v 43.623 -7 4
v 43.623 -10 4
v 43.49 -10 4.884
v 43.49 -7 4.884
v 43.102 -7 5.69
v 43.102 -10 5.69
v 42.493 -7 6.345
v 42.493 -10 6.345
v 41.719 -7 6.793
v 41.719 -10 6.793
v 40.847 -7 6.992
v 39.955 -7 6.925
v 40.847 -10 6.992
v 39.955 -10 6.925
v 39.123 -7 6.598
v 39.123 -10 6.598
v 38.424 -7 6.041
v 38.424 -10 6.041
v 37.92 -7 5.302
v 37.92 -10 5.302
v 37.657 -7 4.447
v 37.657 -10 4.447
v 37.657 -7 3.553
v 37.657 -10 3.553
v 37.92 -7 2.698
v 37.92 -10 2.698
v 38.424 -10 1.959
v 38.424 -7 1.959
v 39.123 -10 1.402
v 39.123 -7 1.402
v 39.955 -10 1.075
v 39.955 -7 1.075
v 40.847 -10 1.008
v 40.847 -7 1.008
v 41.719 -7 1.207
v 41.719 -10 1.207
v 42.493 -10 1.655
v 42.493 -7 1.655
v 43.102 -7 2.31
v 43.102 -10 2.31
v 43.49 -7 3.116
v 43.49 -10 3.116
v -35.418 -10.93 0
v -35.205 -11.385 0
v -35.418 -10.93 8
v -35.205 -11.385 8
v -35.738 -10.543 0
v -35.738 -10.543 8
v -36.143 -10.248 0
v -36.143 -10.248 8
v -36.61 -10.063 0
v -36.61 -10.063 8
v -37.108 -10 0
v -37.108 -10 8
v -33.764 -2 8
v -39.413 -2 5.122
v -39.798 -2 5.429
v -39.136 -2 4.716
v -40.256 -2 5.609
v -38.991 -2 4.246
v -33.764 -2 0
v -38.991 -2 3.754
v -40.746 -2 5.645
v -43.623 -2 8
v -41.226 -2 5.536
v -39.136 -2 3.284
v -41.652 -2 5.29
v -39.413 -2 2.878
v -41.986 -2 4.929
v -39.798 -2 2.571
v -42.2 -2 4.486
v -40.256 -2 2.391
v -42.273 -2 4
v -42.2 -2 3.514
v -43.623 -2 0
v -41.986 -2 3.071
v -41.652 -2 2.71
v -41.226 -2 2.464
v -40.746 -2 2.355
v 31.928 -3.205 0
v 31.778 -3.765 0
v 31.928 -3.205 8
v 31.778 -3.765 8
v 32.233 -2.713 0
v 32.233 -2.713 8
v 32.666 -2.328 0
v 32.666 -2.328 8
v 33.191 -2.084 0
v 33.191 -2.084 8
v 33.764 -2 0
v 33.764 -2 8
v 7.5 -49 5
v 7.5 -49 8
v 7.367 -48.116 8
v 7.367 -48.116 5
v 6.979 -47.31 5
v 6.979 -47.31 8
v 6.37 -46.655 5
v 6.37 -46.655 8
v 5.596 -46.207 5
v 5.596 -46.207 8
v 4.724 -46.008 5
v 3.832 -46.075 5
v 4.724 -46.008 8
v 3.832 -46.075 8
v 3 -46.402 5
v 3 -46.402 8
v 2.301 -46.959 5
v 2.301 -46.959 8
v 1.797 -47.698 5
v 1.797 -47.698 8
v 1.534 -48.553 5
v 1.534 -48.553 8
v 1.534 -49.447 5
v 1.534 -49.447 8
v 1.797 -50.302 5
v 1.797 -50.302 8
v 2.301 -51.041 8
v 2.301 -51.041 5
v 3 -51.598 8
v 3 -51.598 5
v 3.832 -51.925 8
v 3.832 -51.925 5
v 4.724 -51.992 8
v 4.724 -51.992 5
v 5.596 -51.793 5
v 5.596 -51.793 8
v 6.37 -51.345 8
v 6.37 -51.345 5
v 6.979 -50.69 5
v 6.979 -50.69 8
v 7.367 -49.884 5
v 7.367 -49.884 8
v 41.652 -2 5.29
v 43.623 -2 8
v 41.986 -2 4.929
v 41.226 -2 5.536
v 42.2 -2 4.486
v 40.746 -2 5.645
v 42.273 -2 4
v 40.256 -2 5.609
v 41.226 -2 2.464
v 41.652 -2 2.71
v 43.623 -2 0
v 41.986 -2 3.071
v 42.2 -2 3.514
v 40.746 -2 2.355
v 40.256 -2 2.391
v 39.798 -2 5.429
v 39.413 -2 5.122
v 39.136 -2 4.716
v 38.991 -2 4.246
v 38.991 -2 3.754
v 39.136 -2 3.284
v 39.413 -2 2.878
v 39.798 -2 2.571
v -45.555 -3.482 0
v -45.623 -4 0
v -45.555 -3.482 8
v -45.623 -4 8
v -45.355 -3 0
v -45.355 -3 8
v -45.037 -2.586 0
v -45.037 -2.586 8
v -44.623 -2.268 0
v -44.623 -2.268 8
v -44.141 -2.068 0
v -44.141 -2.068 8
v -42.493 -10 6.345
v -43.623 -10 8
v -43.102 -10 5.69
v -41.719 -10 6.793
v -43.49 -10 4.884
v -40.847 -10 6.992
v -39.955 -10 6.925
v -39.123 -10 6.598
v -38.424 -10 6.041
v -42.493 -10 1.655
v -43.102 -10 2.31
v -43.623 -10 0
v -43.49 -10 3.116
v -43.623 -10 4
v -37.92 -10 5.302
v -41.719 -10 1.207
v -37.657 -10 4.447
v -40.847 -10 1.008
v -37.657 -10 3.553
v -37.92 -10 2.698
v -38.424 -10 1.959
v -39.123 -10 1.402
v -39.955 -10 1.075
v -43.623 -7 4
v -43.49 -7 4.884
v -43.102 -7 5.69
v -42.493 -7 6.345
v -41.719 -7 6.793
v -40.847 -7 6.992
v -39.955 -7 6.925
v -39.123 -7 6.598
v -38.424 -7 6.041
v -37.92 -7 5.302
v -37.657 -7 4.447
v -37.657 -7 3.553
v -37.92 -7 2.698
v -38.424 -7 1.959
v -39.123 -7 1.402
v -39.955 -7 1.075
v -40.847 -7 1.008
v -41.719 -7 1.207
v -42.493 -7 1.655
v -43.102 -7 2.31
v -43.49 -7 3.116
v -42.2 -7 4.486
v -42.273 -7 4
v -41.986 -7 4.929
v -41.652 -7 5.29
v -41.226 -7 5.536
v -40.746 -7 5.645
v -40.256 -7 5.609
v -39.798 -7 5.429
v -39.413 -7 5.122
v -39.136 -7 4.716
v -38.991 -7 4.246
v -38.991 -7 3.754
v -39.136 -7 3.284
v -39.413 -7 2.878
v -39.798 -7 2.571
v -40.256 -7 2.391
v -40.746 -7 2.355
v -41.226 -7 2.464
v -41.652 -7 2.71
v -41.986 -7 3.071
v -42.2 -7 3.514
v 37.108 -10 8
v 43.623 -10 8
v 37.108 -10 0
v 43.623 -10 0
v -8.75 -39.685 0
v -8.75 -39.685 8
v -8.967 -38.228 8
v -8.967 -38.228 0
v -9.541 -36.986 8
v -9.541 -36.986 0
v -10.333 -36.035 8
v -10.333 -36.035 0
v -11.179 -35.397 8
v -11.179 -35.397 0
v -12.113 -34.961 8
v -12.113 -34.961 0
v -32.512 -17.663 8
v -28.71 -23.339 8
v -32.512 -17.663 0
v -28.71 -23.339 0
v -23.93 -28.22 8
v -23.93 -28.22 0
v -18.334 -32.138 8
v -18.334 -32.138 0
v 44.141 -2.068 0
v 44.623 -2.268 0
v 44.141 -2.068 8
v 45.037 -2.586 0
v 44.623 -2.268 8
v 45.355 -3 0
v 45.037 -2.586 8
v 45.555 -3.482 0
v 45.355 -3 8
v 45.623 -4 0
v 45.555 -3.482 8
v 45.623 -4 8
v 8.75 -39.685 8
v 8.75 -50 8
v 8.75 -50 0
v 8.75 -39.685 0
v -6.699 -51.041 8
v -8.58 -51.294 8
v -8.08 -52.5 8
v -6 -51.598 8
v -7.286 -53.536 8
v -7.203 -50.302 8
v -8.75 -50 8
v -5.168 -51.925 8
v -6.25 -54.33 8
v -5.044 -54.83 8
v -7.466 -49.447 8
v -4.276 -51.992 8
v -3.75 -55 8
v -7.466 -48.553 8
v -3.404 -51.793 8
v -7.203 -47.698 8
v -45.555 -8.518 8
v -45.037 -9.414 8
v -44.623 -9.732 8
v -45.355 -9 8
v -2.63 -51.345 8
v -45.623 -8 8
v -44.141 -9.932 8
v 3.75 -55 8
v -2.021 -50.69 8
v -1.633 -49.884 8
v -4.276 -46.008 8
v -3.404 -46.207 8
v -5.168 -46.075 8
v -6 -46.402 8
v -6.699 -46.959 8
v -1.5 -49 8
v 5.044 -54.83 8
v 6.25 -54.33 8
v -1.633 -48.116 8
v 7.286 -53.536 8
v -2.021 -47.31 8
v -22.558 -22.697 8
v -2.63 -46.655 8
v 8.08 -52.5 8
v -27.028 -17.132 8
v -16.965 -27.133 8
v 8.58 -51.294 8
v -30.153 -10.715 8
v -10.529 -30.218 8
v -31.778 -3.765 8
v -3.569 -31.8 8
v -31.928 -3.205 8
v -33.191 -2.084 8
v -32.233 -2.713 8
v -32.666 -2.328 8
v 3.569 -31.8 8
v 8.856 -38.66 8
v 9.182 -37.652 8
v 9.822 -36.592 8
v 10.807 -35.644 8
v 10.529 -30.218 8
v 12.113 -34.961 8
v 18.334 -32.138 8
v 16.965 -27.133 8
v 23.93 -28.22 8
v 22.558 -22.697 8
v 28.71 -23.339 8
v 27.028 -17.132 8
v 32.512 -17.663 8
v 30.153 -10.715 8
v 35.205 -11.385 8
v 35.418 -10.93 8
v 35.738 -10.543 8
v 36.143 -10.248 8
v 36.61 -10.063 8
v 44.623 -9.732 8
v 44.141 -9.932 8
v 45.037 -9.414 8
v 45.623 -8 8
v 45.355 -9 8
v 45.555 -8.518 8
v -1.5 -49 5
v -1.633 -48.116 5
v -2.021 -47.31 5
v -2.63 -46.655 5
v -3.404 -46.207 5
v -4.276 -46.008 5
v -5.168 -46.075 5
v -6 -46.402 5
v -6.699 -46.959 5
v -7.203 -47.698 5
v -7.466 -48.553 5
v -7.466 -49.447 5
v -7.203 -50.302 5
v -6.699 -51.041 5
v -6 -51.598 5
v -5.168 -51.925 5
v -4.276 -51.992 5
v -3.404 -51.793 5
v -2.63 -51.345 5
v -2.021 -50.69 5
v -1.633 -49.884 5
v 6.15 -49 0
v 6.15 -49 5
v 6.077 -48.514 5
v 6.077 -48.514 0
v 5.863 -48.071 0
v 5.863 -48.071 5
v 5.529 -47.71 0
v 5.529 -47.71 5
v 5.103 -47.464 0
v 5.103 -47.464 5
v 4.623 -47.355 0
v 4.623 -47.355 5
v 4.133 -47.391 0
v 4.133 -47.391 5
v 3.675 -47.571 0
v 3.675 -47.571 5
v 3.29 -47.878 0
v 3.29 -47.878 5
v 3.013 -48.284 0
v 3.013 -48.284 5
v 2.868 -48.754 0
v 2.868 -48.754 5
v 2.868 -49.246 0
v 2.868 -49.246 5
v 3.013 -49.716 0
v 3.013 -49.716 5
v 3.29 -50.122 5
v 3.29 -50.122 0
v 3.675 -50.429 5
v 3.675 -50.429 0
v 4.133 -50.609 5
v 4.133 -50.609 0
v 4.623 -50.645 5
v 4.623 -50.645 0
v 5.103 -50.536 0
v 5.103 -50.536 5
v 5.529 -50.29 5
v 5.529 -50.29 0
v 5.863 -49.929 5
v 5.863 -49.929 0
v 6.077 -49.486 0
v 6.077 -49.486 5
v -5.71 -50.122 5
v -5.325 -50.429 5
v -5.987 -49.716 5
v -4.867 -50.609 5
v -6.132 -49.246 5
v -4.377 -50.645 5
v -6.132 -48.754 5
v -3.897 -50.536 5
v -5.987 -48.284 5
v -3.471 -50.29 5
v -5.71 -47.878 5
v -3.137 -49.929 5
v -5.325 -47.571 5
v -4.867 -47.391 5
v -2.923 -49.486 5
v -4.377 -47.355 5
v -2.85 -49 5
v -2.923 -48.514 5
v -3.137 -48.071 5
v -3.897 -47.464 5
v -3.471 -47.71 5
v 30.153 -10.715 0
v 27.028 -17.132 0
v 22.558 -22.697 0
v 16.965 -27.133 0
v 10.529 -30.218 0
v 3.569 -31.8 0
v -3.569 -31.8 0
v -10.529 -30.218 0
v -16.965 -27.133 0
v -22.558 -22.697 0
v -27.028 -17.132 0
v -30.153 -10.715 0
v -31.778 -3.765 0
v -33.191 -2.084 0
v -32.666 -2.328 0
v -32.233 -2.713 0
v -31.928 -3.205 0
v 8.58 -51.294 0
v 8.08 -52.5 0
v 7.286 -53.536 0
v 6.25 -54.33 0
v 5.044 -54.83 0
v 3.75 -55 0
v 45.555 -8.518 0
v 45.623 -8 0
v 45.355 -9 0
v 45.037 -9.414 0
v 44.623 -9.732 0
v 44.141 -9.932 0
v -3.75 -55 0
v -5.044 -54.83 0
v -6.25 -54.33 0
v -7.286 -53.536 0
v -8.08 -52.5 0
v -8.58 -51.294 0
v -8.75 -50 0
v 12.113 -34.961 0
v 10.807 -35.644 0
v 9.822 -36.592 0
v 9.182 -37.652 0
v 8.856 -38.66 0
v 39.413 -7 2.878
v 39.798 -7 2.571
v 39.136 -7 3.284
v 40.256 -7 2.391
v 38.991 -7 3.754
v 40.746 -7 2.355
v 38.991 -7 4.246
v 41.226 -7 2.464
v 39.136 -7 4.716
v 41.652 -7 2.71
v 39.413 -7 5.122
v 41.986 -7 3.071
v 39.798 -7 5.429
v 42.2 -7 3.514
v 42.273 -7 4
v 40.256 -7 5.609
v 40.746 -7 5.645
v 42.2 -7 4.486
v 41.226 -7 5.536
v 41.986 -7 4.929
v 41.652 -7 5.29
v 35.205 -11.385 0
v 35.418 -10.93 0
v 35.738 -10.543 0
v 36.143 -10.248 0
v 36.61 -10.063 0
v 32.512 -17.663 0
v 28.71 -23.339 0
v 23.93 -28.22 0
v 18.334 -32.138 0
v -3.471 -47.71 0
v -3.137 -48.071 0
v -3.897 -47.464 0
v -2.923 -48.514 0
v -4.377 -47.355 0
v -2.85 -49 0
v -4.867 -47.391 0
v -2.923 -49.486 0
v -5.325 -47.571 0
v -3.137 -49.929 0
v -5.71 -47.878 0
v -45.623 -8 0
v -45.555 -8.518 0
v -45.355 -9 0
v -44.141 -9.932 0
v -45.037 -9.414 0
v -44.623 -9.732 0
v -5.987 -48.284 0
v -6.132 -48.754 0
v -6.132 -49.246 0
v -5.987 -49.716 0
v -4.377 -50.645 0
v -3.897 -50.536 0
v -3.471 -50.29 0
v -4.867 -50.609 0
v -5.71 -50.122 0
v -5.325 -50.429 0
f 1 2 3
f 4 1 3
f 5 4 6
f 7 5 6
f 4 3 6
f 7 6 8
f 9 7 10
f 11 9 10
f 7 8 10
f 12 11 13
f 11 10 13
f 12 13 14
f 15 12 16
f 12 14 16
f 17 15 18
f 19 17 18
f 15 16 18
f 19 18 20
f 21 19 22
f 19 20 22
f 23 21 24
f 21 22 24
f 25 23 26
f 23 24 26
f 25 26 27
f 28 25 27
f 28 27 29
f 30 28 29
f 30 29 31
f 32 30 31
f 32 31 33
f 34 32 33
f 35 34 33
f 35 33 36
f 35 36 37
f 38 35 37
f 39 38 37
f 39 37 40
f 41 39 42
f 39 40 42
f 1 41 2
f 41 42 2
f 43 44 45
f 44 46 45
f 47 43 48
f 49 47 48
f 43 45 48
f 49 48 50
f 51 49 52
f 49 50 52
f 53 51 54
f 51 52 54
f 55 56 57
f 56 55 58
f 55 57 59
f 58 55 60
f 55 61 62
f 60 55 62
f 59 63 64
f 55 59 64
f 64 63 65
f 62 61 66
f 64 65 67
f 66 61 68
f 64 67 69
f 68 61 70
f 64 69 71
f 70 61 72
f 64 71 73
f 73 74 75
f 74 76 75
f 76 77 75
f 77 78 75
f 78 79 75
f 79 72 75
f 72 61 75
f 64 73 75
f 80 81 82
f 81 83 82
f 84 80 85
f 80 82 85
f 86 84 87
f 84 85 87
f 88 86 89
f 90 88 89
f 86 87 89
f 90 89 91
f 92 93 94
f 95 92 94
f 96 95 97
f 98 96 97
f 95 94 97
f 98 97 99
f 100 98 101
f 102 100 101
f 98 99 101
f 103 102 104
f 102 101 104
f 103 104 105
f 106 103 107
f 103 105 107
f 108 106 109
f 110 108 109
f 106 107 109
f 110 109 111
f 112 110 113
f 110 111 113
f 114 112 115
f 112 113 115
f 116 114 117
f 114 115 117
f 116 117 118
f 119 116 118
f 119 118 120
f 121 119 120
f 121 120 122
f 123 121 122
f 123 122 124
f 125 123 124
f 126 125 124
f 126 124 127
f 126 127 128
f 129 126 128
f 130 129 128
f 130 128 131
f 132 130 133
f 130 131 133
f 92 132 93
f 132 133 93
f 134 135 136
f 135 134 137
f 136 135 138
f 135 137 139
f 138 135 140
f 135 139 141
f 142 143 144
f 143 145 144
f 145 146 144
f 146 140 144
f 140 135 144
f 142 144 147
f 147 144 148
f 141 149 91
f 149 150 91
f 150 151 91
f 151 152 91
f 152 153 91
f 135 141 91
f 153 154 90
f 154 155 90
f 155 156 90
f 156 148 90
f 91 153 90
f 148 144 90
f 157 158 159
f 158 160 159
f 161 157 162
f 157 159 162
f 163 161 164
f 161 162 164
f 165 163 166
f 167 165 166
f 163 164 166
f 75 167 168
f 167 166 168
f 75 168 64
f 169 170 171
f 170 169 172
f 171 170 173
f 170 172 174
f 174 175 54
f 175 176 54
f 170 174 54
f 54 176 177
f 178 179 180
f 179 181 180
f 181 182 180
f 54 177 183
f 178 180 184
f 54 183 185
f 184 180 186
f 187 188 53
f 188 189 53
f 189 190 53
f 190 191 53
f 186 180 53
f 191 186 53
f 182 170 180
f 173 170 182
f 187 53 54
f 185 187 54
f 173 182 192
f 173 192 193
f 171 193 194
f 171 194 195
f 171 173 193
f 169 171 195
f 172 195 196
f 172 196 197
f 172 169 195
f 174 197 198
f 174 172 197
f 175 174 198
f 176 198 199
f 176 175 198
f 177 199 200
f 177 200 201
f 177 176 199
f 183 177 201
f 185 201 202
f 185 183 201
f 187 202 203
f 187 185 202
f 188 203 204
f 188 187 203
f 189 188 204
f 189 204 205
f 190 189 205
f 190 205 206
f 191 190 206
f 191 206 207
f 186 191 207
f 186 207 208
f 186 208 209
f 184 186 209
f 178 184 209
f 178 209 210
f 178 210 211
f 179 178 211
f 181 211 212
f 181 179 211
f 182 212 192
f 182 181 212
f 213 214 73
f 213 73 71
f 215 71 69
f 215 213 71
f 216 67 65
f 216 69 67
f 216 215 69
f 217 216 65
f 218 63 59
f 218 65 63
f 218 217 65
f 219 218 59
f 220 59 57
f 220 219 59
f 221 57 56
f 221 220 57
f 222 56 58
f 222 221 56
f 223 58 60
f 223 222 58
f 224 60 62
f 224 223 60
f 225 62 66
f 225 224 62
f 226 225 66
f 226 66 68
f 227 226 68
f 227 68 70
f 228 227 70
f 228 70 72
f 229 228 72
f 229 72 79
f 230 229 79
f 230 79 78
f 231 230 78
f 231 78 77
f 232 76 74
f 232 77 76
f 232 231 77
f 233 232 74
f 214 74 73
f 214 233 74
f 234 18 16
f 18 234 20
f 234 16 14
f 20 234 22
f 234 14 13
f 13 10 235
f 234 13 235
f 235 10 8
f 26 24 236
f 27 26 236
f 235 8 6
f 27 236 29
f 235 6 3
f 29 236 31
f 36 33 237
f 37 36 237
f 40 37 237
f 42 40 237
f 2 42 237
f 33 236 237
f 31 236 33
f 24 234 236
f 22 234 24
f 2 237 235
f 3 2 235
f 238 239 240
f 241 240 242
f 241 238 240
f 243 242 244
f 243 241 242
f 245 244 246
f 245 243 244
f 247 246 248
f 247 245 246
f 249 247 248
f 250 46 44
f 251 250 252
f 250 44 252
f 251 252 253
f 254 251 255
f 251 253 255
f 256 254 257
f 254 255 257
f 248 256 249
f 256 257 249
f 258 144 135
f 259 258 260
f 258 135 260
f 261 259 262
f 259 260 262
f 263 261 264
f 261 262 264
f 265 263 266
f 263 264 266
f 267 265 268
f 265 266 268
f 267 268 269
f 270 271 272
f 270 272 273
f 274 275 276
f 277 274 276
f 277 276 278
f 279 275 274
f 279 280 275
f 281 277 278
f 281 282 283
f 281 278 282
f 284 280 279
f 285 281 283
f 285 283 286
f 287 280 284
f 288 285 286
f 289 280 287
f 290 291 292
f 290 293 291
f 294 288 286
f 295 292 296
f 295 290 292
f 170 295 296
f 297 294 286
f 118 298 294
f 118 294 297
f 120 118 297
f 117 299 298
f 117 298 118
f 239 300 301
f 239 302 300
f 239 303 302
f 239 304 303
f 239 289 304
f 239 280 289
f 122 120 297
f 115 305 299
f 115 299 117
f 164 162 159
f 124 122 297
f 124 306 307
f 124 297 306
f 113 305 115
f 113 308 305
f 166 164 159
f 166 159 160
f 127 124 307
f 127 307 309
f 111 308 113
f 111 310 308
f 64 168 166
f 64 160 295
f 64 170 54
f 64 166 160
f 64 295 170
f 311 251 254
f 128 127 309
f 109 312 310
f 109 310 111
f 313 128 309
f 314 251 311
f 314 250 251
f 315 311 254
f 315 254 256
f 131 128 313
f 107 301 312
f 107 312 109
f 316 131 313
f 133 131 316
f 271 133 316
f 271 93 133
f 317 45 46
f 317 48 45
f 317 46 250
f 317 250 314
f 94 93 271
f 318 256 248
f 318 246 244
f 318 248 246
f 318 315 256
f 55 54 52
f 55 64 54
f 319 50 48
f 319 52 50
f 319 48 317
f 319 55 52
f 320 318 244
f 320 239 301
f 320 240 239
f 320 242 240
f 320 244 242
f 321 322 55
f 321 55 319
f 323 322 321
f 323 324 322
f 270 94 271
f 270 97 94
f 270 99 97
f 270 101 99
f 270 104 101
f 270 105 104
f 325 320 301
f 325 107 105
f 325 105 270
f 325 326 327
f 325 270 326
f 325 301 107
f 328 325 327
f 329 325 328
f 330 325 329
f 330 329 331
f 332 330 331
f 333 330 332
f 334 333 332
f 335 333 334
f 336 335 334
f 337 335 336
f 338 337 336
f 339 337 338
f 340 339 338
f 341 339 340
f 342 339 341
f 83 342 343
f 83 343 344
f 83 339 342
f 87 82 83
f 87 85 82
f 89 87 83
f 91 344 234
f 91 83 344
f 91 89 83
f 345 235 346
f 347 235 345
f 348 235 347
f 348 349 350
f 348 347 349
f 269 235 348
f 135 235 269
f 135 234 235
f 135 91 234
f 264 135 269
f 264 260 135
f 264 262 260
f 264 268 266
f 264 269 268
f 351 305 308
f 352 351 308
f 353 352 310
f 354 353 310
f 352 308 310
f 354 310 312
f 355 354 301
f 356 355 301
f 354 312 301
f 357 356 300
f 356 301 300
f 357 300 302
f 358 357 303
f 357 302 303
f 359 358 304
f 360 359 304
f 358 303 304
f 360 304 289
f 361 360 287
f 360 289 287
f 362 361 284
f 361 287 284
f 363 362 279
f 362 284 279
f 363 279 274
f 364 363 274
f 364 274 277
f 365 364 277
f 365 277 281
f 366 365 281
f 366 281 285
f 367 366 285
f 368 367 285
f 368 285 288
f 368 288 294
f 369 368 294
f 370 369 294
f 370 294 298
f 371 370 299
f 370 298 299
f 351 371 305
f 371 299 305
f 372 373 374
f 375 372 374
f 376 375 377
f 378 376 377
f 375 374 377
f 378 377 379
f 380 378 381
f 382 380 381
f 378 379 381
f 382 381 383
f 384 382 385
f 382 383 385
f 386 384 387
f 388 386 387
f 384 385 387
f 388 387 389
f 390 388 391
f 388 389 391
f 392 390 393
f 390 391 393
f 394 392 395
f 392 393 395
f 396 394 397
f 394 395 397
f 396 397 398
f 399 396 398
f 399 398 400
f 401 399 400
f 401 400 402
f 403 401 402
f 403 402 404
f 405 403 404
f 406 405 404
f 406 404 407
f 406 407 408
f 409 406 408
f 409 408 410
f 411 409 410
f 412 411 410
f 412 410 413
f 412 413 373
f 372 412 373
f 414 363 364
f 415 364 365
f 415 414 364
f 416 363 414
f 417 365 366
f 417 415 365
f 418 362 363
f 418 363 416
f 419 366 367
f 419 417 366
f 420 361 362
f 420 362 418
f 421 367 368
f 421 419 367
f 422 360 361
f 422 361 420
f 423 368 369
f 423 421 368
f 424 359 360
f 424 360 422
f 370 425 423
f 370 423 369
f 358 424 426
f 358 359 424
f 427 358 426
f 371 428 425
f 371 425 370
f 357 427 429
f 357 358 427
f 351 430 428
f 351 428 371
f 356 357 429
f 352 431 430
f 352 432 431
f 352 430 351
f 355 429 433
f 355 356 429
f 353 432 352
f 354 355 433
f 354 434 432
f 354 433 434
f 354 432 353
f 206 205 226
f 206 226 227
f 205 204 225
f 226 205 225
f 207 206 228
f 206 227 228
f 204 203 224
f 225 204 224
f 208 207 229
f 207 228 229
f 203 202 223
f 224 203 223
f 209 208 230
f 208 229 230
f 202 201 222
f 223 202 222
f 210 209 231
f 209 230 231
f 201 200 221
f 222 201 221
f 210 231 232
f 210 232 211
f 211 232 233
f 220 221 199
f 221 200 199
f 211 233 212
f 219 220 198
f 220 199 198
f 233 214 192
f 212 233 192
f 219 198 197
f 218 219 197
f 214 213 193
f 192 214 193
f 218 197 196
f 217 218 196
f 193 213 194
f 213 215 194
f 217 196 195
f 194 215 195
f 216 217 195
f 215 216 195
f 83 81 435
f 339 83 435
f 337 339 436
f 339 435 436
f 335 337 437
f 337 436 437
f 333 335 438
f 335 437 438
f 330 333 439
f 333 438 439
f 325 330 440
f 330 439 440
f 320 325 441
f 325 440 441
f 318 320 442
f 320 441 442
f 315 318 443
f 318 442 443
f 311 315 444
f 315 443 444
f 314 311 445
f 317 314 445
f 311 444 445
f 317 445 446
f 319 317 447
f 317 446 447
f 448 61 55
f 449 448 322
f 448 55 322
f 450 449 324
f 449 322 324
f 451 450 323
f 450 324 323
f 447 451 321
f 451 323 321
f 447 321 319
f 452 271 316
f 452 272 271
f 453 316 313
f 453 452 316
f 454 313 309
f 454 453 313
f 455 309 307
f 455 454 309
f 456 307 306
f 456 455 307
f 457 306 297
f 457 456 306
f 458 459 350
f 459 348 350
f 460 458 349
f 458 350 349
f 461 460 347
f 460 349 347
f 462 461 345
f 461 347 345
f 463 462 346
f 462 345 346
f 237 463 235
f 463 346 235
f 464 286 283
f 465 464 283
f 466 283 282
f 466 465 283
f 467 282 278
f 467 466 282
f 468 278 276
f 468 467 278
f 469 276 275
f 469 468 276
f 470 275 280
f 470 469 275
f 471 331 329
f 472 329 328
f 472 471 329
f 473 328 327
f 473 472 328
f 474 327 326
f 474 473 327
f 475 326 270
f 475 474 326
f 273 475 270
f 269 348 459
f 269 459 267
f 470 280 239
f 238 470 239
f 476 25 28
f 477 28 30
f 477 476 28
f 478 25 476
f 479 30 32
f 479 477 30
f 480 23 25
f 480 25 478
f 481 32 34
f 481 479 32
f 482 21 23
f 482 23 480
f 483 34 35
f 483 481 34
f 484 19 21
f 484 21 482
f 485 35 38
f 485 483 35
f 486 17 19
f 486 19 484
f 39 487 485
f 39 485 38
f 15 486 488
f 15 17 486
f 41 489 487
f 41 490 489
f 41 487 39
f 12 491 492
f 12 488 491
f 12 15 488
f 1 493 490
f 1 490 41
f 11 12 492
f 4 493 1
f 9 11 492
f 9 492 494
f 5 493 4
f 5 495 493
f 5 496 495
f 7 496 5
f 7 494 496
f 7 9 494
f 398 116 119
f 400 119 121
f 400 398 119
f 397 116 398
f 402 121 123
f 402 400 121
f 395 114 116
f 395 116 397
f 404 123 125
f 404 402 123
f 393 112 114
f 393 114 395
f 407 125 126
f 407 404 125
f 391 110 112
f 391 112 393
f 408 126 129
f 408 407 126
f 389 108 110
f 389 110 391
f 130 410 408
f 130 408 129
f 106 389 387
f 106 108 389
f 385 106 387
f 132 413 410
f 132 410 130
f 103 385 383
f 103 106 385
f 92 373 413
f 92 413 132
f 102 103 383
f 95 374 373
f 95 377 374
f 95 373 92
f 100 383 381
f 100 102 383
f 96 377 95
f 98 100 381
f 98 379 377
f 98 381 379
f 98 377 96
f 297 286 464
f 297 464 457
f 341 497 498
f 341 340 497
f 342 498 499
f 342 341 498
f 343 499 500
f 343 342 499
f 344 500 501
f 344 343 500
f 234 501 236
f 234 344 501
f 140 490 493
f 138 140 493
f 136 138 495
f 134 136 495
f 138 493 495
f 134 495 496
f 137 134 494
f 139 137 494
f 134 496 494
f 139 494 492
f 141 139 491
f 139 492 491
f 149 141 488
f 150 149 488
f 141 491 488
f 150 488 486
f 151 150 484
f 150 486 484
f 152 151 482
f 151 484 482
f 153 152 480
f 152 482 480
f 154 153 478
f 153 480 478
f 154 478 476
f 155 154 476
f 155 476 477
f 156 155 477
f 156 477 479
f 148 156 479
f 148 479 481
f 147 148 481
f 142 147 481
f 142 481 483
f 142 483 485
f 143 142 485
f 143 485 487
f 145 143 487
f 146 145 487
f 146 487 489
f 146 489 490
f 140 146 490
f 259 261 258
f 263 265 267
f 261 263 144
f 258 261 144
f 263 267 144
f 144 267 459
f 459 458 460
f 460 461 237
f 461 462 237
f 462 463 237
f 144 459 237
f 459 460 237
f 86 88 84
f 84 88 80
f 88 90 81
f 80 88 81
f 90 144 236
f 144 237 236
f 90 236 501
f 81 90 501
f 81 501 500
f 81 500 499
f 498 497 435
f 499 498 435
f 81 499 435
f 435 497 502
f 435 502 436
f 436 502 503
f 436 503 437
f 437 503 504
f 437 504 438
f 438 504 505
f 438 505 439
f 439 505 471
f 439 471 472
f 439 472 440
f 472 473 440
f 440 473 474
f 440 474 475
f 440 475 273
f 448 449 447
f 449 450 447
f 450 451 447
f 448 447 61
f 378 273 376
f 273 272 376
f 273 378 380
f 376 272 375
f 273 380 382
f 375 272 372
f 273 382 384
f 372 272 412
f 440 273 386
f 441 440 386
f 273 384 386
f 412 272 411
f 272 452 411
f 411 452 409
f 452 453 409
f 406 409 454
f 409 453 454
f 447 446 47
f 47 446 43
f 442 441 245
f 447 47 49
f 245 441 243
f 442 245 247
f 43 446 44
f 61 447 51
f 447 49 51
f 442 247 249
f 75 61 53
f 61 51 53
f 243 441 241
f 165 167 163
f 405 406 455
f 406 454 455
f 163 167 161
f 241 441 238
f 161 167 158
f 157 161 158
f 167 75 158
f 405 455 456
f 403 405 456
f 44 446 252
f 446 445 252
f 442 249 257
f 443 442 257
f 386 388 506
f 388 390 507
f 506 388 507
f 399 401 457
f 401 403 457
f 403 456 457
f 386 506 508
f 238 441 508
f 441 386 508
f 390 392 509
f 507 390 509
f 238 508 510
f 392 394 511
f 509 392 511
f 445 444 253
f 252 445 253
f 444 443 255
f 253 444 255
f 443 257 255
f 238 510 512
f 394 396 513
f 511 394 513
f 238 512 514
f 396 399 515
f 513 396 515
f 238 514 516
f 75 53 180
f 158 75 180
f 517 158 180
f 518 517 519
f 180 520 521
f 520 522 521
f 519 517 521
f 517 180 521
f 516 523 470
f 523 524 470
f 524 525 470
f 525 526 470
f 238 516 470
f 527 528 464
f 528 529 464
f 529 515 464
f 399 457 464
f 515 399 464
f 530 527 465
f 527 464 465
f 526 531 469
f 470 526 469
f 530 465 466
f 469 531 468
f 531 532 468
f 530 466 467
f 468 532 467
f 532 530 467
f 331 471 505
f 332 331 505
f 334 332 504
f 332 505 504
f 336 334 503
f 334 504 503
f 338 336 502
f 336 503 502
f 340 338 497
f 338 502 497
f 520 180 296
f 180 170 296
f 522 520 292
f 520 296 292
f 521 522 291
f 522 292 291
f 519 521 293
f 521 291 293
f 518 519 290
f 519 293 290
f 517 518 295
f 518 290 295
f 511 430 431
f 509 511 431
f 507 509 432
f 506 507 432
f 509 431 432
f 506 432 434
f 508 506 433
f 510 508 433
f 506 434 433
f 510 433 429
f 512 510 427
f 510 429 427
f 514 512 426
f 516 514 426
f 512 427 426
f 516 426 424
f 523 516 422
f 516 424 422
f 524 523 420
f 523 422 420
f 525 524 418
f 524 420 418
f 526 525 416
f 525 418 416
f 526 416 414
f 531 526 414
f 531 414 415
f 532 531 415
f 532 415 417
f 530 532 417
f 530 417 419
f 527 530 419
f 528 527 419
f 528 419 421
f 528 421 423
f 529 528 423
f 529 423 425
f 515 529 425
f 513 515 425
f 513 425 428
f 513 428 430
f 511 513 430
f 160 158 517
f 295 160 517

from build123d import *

# Parameters (mm, degrees)
SKETCH3_R           = 8.05
BOSS_EXTRUDE1_DEPTH = 8
SKETCH4_R           = 8.05
SKETCH4_R_2         = 4.3
BOSS_EXTRUDE2_DEPTH = 3
CHAMFER1_SIZE       = 3
FILLET1_R           = 11
SKETCH5_R           = 1.65
CUT_EXTRUDE1_DEPTH  = 85.020655349
SKETCH6_R           = 3
CUT_EXTRUDE2_DEPTH  = 3
SKETCH7_W           = 22
SKETCH7_H           = 25.1
CUT_EXTRUDE3_DEPTH  = 93.528214752
FILLET2_R           = 2
SKETCH8_R           = 1.65
CUT_EXTRUDE4_DEPTH  = 72.905914397
CUT_EXTRUDE5_DEPTH  = 72.905914397
FILLET3_R           = 5
SKETCH10_R          = 3
CUT_EXTRUDE6_DEPTH  = 3


with BuildPart() as part:
    # Sketch3 → Boss-Extrude1 (new body)
    with BuildSketch(Plane.XY):
        with BuildLine():
            Line((-31.937438845, -2), (-45.623026261, -2))
            Line((-45.623026261, -2), (-45.623026261, -10))
            Line((-45.623026261, -10), (-35.623026261, -10))
            ThreePointArc((-35.623026261, -10), (-26.529067588, -25.791637654), (-11, -35.327043465))
            Line((-11, -35.327043465), (-11, -80.1))
            Line((-11, -80.1), (11, -80.1))
            Line((11, -80.1), (11, -35.327043465))
            ThreePointArc((11, -35.327043465), (26.529067588, -25.791637654), (35.623026261, -10))
            Line((35.623026261, -10), (45.623026261, -10))
            Line((45.623026261, -10), (45.623026261, -2))
            Line((45.623026261, -2), (31.937438845, -2))
            ThreePointArc((31.937438845, -2), (0, -32), (-31.937438845, -2))
        make_face()
        with Locations((0, -69.1)):
            Circle(SKETCH3_R, mode=Mode.SUBTRACT)
    extrude(amount=BOSS_EXTRUDE1_DEPTH)

    # Sketch4 → Boss-Extrude2 (add)
    with BuildSketch(Plane.XY):
        with Locations(Location((0, -69.1, 0), (0, 0, 180))):
            Circle(SKETCH4_R)
        with Locations(Location((0, -69.1, 0), (0, 0, 180))):
            Circle(SKETCH4_R_2, mode=Mode.SUBTRACT)
    extrude(amount=BOSS_EXTRUDE2_DEPTH)

    # Chamfer1
    chamfer1_edges = [part.edges().sort_by_distance(p)[0] for p in [
        (0, -80.1, 0),
    ]]
    chamfer(chamfer1_edges, length=CHAMFER1_SIZE)

    # Fillet1
    fillet1_edges = [part.edges().sort_by_distance(p)[0] for p in [
        (-11, -80.1, 5.5),
        (11, -80.1, 5.5),
    ]]
    fillet(fillet1_edges, radius=FILLET1_R - 0.0001)  # a hair under: the kernel refuses the full size

    # Sketch5 → Cut-Extrude1 (cut, through all)
    with BuildSketch(Plane.XZ.offset(10)):
        with Locations((40.623026261, 4)):
            Circle(SKETCH5_R)
    cut_extrude1 = extrude(amount=-CUT_EXTRUDE1_DEPTH, mode=Mode.SUBTRACT)

    # Sketch6 → Cut-Extrude2 (cut)
    with BuildSketch(Plane.XZ.offset(10)):
        with Locations((40.623026261, 4)):
            Circle(SKETCH6_R)
    cut_extrude2 = extrude(amount=-CUT_EXTRUDE2_DEPTH, mode=Mode.SUBTRACT)

    # Mirror1: Cut-Extrude1, Cut-Extrude2 across plane
    add(cut_extrude1.mirror(Plane(origin=(0, 0, 0), x_dir=(0, 0, 1), z_dir=(1, 0, 0))), mode=Mode.SUBTRACT)
    add(cut_extrude2.mirror(Plane(origin=(0, 0, 0), x_dir=(0, 0, 1), z_dir=(1, 0, 0))), mode=Mode.SUBTRACT)

    # Sketch7 → Cut-Extrude3 (cut, through all)
    with BuildSketch(Plane.XY.offset(8)):
        with Locations((0, -67.55)):
            Rectangle(SKETCH7_W, SKETCH7_H)
    extrude(amount=-CUT_EXTRUDE3_DEPTH, mode=Mode.SUBTRACT)

    # Fillet2
    fillet2_edges = [part.edges().sort_by_distance(p)[0] for p in [
        (-45.623026261, -2, 4),
        (-31.937438845, -2, 4),
        (31.937438845, -2, 4),
        (45.623026261, -2, 4),
        (45.623026261, -10, 4),
        (35.623026261, -10, 4),
        (-35.623026261, -10, 4),
        (-45.623026261, -10, 4),
    ]]
    fillet(fillet2_edges, radius=FILLET2_R - 0.0001)  # a hair under: the kernel refuses the full size

    # Sketch8 → Cut-Extrude4 (cut, through all)
    with BuildSketch(Plane.XY.offset(8)):
        with Locations((4.5, -49)):
            Circle(SKETCH8_R)
        with Locations((-4.5, -49)):
            Circle(SKETCH8_R)
    extrude(amount=-CUT_EXTRUDE4_DEPTH, mode=Mode.SUBTRACT)

    # Sketch9 → Cut-Extrude5 (cut, through all)
    with BuildSketch(Plane.XY.offset(8)):
        with BuildLine():
            Line((-8.75, -55), (-8.75, -35.950486784))
            ThreePointArc((-8.75, -35.950486784), (-9.879918795, -35.656517001), (-11, -35.327043465))
            Line((-11, -35.327043465), (-11, -55))
            Line((-11, -55), (-8.75, -55))
        make_face()
        with BuildLine():
            Line((8.75, -55), (8.75, -35.950486784))
            ThreePointArc((8.75, -35.950486784), (9.879918795, -35.656517001), (11, -35.327043465))
            Line((11, -35.327043465), (11, -55))
            Line((11, -55), (8.75, -55))
        make_face()
    extrude(amount=-CUT_EXTRUDE5_DEPTH, mode=Mode.SUBTRACT)

    # Fillet3
    fillet3_edges = [part.edges().sort_by_distance(p)[0] for p in [
        (-8.75, -55, 4),
        (-8.75, -35.950486784, 4),
        (8.75, -55, 4),
        (8.75, -35.950486784, 4),
    ]]
    fillet(fillet3_edges, radius=FILLET3_R)

    # Sketch10 → Cut-Extrude6 (cut)
    with BuildSketch(Plane.XY.offset(8)):
        with Locations((4.5, -49)):
            Circle(SKETCH10_R)
        with Locations((-4.5, -49)):
            Circle(SKETCH10_R)
    extrude(amount=-CUT_EXTRUDE6_DEPTH, mode=Mode.SUBTRACT)


solid = part.part
